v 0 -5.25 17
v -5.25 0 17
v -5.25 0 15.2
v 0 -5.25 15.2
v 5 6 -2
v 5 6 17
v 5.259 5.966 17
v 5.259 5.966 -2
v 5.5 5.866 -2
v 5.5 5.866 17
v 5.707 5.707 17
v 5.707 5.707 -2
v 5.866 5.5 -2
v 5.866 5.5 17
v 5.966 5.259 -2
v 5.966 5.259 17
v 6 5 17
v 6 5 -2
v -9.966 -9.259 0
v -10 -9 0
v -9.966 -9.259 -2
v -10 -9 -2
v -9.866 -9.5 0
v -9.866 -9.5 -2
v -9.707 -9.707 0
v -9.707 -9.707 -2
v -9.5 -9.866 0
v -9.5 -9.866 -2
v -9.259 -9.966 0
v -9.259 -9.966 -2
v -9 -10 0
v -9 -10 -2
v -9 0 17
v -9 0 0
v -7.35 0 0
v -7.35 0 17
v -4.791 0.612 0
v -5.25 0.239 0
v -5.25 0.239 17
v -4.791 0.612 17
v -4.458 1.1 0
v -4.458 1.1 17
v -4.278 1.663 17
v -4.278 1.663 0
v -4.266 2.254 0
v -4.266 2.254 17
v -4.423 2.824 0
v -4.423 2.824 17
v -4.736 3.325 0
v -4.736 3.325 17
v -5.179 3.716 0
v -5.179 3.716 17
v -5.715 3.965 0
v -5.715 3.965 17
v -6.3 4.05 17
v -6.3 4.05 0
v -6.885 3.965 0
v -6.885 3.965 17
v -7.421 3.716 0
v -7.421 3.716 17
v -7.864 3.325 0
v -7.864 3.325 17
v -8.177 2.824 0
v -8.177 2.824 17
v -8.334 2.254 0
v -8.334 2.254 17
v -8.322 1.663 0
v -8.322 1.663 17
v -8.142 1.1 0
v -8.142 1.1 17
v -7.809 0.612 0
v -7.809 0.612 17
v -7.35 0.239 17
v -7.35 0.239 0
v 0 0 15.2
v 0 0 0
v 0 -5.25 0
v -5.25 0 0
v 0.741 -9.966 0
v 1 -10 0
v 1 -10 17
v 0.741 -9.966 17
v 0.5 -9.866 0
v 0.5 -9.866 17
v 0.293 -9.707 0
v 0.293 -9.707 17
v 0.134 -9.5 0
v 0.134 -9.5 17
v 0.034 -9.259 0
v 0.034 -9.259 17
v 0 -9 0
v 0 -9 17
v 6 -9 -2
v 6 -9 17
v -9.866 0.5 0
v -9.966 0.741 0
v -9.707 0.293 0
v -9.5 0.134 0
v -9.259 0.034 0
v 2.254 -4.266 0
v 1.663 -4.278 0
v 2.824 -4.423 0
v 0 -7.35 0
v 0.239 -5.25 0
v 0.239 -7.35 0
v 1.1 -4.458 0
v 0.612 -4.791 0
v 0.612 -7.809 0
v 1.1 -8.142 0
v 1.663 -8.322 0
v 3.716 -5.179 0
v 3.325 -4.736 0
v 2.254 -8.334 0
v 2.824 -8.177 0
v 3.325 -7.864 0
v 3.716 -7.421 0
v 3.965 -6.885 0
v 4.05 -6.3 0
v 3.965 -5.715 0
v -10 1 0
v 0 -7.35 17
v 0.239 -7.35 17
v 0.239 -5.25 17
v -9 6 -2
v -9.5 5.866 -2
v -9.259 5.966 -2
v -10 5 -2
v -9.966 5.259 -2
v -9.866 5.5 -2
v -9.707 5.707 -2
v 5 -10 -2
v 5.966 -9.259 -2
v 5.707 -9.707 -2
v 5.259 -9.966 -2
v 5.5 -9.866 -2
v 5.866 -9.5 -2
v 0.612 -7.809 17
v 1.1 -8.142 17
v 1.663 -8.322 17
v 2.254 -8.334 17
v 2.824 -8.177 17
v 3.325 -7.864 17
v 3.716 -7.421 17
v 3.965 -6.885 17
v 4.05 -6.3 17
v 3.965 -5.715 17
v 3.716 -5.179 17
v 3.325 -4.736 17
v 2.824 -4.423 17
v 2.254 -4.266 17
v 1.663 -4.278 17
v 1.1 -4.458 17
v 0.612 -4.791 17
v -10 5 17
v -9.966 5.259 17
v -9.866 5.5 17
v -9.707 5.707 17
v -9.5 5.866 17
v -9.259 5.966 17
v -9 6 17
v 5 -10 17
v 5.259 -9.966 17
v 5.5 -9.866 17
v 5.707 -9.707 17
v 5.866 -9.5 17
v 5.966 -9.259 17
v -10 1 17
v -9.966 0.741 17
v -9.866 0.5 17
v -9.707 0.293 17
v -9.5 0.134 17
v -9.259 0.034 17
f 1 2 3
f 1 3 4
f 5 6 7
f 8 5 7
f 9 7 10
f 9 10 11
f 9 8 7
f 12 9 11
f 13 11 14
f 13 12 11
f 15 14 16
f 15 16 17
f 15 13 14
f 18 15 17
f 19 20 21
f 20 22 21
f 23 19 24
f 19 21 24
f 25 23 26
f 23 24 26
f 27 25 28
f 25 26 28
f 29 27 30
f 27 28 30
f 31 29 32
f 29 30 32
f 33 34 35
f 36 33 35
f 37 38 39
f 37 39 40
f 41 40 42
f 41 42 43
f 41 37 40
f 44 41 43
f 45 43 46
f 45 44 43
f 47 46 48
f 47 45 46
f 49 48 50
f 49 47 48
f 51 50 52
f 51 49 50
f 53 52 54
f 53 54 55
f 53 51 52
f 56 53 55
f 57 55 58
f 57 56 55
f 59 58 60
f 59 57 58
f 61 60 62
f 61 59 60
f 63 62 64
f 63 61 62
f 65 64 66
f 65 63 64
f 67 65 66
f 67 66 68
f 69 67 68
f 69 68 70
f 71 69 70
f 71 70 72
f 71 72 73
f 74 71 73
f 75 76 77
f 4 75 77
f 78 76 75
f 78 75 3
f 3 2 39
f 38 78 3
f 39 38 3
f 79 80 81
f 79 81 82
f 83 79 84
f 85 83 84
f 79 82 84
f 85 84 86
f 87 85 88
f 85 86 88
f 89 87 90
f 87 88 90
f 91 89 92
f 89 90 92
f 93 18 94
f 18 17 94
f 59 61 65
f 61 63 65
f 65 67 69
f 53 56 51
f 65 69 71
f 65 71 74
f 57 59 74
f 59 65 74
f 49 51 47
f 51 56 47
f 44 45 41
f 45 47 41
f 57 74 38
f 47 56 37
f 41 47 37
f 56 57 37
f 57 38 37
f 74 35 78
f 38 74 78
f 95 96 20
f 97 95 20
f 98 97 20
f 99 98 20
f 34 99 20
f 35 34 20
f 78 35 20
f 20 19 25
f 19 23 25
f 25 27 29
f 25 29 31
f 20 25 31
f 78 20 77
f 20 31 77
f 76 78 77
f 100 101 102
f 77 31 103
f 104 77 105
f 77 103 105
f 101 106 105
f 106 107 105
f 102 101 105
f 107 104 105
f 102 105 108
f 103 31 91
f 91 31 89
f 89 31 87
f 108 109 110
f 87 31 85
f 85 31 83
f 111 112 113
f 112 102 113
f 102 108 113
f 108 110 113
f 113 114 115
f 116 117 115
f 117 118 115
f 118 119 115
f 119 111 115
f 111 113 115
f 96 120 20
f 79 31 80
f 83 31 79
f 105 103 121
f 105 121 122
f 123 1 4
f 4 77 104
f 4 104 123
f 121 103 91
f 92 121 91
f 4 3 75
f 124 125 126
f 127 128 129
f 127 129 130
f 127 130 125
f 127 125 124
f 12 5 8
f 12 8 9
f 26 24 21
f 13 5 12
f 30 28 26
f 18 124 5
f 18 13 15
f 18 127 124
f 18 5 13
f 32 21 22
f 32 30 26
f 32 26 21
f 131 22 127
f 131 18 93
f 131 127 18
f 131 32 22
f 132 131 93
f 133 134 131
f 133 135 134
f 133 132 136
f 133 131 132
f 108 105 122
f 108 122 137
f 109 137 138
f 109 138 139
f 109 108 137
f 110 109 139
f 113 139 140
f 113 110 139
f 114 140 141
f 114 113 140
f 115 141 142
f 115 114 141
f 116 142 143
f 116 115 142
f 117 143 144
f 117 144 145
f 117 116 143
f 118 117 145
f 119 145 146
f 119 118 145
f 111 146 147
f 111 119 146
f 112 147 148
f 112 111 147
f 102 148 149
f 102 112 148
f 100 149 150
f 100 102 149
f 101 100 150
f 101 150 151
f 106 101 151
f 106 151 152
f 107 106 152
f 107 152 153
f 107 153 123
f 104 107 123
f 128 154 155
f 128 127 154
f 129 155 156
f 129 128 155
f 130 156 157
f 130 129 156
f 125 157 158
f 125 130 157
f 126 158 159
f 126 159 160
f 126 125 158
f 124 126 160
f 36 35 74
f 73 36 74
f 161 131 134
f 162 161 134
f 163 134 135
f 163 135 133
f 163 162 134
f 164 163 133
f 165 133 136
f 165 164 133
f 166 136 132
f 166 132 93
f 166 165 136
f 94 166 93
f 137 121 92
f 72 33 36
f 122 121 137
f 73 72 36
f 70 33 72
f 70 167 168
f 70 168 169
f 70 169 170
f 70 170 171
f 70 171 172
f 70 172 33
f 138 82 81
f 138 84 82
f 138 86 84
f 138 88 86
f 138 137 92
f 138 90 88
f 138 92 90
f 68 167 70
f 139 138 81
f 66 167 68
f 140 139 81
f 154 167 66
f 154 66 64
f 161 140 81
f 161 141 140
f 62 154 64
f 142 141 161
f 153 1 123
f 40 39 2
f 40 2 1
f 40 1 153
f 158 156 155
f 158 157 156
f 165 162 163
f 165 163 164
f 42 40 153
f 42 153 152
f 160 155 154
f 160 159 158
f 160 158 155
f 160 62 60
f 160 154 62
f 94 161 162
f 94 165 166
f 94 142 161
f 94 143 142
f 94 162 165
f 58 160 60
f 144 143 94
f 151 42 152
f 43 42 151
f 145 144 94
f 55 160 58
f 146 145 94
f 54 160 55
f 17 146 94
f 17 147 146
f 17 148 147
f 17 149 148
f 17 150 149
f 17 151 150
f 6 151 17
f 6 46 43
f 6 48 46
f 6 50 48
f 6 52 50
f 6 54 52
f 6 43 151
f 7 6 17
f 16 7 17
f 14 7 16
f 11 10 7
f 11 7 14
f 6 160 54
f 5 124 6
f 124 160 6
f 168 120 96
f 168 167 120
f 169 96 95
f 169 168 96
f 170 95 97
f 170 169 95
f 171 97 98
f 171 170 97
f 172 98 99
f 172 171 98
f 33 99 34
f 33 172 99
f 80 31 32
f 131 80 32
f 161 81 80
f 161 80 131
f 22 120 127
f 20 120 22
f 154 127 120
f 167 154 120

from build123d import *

# Parameters (mm, degrees)
PAD_DEPTH    = 17
SKETCH001_W  = 16
SKETCH001_H  = 16
PAD001_DEPTH = 2
PAD002_DEPTH = 1.8
FILLET_R     = 1


with BuildPart() as part:
    # Sketch → Pad (new body)
    with BuildSketch(Plane.XY):
        with BuildLine():
            Line((-10, 0), (-10, 6))
            Line((-10, 6), (6, 6))
            Line((6, 6), (6, -10))
            Line((6, -10), (0, -10))
            Line((0, -7.35), (0, -10))
            Line((0, -7.35), (0.239318, -7.35))
            ThreePointArc((0.239318, -7.35), (4.05, -6.3), (0.239318, -5.25))
            Line((0, -5.25), (0.239318, -5.25))
            Line((0, 0), (0, -5.25))
            Line((0, 0), (-5.25, 0))
            Line((-5.25, 0), (-5.25, 0.239318))
            ThreePointArc((-5.25, 0.239318), (-6.3, 4.05), (-7.35, 0.239318))
            Line((-7.35, 0), (-7.35, 0.239318))
            Line((-10, 0), (-7.35, 0))
        make_face()
    extrude(amount=PAD_DEPTH)

    # Sketch001 (on Face15 of Pad) → Pad001 (join)
    with BuildSketch(Plane(origin=(0, 0, 0), x_dir=(1, 0, 0), z_dir=(0, 0, -1))):
        with Locations((-2, 2)):
            Rectangle(SKETCH001_W, SKETCH001_H)
    extrude(amount=PAD001_DEPTH)

    # Sketch002 (on Face1 of Pad001) → Pad002 (join)
    with BuildSketch(Plane.XY.offset(17)):
        Polygon((-5.25, 0), (0, -5.25), (0, 0), align=None)
    extrude(amount=-PAD002_DEPTH)

    # Fillet
    fillet_edges = [part.edges().sort_by_distance(p)[0] for p in [
        (6, -10, 7.5),
        (6, 6, 7.5),
        (-10, 6, 7.5),
        (0, -10, 8.5),
        (-10, 0, 8.5),
        (-10, -10, -1),
    ]]
    fillet(fillet_edges, radius=FILLET_R)


solid = part.part
